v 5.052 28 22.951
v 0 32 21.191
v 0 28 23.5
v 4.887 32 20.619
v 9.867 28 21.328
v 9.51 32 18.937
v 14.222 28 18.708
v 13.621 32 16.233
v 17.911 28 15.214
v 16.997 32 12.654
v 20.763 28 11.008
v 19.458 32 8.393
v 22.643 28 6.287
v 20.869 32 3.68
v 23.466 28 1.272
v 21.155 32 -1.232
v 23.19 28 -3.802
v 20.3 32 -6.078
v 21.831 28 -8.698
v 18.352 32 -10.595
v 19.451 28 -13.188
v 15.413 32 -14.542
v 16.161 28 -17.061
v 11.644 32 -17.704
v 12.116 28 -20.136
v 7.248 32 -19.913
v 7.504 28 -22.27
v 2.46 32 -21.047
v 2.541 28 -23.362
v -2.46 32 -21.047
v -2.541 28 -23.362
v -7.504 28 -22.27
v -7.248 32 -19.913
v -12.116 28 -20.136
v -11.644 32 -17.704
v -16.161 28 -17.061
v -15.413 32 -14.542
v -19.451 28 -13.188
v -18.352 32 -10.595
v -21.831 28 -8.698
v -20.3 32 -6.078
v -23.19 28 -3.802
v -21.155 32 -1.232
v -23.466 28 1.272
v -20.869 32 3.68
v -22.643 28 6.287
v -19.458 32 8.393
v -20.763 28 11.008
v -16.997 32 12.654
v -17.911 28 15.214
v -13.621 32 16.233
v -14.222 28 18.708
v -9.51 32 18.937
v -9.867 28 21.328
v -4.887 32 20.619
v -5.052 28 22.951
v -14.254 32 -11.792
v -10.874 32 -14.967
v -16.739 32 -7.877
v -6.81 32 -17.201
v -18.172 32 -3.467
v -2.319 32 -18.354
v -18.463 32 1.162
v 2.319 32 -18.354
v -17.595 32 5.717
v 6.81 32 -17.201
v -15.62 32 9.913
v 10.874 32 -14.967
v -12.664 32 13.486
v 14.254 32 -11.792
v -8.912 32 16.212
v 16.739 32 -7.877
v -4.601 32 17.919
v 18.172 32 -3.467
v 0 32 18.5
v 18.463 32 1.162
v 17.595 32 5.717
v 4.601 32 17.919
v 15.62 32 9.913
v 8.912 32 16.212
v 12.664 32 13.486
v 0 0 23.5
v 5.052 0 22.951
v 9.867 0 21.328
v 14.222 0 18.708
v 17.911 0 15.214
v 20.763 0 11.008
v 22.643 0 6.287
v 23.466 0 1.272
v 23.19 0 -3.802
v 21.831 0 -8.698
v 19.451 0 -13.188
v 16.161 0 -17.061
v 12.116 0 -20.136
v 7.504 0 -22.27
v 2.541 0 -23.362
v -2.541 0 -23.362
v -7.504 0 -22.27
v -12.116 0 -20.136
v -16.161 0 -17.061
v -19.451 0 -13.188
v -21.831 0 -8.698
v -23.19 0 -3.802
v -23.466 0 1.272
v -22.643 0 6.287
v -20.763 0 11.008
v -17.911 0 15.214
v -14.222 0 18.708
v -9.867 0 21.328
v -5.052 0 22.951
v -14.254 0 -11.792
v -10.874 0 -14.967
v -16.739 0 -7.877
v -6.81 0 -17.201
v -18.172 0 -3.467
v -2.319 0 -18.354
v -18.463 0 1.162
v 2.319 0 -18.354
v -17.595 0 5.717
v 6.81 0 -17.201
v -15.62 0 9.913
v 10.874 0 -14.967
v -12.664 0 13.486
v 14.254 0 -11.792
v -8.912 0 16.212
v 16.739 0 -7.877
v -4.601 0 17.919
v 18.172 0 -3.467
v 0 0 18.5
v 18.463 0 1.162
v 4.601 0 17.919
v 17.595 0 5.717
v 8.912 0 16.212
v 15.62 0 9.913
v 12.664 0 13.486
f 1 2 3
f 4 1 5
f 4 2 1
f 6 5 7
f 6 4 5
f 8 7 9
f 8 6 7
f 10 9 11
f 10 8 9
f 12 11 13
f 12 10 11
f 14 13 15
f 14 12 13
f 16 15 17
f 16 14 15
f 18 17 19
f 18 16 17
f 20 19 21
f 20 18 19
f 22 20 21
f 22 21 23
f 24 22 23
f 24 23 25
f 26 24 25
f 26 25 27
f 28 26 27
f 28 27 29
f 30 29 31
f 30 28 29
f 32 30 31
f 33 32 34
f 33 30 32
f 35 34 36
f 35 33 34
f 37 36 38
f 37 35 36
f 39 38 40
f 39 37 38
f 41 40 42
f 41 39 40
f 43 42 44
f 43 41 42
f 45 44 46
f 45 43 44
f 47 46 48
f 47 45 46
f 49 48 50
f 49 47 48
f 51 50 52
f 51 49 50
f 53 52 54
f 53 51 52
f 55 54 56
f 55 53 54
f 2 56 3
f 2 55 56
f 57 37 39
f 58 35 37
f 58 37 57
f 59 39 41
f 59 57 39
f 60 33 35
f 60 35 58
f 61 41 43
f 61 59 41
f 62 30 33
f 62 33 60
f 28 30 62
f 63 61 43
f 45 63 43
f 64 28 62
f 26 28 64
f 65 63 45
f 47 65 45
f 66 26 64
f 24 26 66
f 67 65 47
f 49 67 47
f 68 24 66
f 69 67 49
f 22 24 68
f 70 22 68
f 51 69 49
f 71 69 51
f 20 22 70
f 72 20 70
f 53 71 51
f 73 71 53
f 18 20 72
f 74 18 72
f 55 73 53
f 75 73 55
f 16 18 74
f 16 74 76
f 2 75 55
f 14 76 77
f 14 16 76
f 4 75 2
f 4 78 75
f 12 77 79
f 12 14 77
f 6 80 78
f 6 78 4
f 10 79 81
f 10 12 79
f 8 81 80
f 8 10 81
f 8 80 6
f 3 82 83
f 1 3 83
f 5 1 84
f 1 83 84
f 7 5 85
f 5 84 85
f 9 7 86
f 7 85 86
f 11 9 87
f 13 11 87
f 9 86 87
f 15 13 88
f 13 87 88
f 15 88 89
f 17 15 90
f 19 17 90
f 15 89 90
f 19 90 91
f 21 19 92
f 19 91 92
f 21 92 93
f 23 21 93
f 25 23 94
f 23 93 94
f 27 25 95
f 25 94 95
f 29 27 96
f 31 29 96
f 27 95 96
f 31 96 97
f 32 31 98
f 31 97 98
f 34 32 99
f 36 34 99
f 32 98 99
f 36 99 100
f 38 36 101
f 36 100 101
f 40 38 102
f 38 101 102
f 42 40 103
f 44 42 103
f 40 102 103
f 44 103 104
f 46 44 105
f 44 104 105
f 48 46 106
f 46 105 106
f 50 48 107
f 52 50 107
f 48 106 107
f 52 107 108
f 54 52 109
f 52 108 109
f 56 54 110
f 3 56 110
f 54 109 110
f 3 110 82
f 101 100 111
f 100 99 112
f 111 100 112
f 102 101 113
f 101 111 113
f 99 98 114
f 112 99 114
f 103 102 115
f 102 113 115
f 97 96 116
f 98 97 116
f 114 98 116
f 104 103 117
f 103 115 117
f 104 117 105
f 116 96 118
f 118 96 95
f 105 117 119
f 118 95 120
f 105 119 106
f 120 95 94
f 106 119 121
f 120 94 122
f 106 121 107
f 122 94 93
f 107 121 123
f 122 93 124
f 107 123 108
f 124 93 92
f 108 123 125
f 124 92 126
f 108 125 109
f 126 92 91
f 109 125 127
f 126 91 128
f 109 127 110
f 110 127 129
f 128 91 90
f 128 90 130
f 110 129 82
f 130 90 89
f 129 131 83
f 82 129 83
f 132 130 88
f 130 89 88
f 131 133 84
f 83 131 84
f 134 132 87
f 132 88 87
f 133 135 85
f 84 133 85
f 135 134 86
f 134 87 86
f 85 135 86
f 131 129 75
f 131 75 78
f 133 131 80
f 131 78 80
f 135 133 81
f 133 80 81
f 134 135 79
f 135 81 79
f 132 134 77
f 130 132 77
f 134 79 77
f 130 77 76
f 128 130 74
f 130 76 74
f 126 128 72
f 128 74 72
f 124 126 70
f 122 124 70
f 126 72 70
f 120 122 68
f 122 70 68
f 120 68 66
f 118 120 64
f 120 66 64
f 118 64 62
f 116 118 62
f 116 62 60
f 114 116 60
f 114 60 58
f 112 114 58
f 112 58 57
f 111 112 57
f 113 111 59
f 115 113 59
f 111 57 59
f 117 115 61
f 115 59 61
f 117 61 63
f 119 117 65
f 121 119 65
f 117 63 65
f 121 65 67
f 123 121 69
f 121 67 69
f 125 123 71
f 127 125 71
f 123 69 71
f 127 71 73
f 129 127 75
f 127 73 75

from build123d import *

# Parameters (mm, degrees)
SKETCH1_R           = 23.5
BOSS_EXTRUDE1_DEPTH = 32
SKETCH2_R           = 18.5
CUT_EXTRUDE1_DEPTH  = 32
CHAMFER1_SIZE       = 4
CHAMFER1_SIZE2      = 2.309401077


with BuildPart() as part:
    # Sketch1 → Boss-Extrude1 (new body)
    with BuildSketch(Plane(origin=(0, 0, 0), x_dir=(1, 0, 0), z_dir=(0, 1, 0))):
        with Locations(Location((0, 0, 0), (0, 0, 270))):
            Circle(SKETCH1_R)
    extrude(amount=BOSS_EXTRUDE1_DEPTH)

    # Sketch2 → Cut-Extrude1 (cut)
    with BuildSketch(Plane(origin=(0, 32, 0), x_dir=(1, 0, 0), z_dir=(0, 1, 0))):
        with Locations(Location((0, 0, 0), (0, 0, 270))):
            Circle(SKETCH2_R)
    extrude(amount=-CUT_EXTRUDE1_DEPTH, mode=Mode.SUBTRACT)

    # Chamfer1
    chamfer1_edges = [part.edges().sort_by_distance(p)[0] for p in [
        (0, 32, -23.5),
    ]]
    chamfer1_side = [part.faces().sort_by_distance(p)[0] for p in [
        (0, 16, -23.5),
    ]]
    chamfer(chamfer1_edges, length=CHAMFER1_SIZE, length2=CHAMFER1_SIZE2, reference=chamfer1_side[0])


solid = part.part
